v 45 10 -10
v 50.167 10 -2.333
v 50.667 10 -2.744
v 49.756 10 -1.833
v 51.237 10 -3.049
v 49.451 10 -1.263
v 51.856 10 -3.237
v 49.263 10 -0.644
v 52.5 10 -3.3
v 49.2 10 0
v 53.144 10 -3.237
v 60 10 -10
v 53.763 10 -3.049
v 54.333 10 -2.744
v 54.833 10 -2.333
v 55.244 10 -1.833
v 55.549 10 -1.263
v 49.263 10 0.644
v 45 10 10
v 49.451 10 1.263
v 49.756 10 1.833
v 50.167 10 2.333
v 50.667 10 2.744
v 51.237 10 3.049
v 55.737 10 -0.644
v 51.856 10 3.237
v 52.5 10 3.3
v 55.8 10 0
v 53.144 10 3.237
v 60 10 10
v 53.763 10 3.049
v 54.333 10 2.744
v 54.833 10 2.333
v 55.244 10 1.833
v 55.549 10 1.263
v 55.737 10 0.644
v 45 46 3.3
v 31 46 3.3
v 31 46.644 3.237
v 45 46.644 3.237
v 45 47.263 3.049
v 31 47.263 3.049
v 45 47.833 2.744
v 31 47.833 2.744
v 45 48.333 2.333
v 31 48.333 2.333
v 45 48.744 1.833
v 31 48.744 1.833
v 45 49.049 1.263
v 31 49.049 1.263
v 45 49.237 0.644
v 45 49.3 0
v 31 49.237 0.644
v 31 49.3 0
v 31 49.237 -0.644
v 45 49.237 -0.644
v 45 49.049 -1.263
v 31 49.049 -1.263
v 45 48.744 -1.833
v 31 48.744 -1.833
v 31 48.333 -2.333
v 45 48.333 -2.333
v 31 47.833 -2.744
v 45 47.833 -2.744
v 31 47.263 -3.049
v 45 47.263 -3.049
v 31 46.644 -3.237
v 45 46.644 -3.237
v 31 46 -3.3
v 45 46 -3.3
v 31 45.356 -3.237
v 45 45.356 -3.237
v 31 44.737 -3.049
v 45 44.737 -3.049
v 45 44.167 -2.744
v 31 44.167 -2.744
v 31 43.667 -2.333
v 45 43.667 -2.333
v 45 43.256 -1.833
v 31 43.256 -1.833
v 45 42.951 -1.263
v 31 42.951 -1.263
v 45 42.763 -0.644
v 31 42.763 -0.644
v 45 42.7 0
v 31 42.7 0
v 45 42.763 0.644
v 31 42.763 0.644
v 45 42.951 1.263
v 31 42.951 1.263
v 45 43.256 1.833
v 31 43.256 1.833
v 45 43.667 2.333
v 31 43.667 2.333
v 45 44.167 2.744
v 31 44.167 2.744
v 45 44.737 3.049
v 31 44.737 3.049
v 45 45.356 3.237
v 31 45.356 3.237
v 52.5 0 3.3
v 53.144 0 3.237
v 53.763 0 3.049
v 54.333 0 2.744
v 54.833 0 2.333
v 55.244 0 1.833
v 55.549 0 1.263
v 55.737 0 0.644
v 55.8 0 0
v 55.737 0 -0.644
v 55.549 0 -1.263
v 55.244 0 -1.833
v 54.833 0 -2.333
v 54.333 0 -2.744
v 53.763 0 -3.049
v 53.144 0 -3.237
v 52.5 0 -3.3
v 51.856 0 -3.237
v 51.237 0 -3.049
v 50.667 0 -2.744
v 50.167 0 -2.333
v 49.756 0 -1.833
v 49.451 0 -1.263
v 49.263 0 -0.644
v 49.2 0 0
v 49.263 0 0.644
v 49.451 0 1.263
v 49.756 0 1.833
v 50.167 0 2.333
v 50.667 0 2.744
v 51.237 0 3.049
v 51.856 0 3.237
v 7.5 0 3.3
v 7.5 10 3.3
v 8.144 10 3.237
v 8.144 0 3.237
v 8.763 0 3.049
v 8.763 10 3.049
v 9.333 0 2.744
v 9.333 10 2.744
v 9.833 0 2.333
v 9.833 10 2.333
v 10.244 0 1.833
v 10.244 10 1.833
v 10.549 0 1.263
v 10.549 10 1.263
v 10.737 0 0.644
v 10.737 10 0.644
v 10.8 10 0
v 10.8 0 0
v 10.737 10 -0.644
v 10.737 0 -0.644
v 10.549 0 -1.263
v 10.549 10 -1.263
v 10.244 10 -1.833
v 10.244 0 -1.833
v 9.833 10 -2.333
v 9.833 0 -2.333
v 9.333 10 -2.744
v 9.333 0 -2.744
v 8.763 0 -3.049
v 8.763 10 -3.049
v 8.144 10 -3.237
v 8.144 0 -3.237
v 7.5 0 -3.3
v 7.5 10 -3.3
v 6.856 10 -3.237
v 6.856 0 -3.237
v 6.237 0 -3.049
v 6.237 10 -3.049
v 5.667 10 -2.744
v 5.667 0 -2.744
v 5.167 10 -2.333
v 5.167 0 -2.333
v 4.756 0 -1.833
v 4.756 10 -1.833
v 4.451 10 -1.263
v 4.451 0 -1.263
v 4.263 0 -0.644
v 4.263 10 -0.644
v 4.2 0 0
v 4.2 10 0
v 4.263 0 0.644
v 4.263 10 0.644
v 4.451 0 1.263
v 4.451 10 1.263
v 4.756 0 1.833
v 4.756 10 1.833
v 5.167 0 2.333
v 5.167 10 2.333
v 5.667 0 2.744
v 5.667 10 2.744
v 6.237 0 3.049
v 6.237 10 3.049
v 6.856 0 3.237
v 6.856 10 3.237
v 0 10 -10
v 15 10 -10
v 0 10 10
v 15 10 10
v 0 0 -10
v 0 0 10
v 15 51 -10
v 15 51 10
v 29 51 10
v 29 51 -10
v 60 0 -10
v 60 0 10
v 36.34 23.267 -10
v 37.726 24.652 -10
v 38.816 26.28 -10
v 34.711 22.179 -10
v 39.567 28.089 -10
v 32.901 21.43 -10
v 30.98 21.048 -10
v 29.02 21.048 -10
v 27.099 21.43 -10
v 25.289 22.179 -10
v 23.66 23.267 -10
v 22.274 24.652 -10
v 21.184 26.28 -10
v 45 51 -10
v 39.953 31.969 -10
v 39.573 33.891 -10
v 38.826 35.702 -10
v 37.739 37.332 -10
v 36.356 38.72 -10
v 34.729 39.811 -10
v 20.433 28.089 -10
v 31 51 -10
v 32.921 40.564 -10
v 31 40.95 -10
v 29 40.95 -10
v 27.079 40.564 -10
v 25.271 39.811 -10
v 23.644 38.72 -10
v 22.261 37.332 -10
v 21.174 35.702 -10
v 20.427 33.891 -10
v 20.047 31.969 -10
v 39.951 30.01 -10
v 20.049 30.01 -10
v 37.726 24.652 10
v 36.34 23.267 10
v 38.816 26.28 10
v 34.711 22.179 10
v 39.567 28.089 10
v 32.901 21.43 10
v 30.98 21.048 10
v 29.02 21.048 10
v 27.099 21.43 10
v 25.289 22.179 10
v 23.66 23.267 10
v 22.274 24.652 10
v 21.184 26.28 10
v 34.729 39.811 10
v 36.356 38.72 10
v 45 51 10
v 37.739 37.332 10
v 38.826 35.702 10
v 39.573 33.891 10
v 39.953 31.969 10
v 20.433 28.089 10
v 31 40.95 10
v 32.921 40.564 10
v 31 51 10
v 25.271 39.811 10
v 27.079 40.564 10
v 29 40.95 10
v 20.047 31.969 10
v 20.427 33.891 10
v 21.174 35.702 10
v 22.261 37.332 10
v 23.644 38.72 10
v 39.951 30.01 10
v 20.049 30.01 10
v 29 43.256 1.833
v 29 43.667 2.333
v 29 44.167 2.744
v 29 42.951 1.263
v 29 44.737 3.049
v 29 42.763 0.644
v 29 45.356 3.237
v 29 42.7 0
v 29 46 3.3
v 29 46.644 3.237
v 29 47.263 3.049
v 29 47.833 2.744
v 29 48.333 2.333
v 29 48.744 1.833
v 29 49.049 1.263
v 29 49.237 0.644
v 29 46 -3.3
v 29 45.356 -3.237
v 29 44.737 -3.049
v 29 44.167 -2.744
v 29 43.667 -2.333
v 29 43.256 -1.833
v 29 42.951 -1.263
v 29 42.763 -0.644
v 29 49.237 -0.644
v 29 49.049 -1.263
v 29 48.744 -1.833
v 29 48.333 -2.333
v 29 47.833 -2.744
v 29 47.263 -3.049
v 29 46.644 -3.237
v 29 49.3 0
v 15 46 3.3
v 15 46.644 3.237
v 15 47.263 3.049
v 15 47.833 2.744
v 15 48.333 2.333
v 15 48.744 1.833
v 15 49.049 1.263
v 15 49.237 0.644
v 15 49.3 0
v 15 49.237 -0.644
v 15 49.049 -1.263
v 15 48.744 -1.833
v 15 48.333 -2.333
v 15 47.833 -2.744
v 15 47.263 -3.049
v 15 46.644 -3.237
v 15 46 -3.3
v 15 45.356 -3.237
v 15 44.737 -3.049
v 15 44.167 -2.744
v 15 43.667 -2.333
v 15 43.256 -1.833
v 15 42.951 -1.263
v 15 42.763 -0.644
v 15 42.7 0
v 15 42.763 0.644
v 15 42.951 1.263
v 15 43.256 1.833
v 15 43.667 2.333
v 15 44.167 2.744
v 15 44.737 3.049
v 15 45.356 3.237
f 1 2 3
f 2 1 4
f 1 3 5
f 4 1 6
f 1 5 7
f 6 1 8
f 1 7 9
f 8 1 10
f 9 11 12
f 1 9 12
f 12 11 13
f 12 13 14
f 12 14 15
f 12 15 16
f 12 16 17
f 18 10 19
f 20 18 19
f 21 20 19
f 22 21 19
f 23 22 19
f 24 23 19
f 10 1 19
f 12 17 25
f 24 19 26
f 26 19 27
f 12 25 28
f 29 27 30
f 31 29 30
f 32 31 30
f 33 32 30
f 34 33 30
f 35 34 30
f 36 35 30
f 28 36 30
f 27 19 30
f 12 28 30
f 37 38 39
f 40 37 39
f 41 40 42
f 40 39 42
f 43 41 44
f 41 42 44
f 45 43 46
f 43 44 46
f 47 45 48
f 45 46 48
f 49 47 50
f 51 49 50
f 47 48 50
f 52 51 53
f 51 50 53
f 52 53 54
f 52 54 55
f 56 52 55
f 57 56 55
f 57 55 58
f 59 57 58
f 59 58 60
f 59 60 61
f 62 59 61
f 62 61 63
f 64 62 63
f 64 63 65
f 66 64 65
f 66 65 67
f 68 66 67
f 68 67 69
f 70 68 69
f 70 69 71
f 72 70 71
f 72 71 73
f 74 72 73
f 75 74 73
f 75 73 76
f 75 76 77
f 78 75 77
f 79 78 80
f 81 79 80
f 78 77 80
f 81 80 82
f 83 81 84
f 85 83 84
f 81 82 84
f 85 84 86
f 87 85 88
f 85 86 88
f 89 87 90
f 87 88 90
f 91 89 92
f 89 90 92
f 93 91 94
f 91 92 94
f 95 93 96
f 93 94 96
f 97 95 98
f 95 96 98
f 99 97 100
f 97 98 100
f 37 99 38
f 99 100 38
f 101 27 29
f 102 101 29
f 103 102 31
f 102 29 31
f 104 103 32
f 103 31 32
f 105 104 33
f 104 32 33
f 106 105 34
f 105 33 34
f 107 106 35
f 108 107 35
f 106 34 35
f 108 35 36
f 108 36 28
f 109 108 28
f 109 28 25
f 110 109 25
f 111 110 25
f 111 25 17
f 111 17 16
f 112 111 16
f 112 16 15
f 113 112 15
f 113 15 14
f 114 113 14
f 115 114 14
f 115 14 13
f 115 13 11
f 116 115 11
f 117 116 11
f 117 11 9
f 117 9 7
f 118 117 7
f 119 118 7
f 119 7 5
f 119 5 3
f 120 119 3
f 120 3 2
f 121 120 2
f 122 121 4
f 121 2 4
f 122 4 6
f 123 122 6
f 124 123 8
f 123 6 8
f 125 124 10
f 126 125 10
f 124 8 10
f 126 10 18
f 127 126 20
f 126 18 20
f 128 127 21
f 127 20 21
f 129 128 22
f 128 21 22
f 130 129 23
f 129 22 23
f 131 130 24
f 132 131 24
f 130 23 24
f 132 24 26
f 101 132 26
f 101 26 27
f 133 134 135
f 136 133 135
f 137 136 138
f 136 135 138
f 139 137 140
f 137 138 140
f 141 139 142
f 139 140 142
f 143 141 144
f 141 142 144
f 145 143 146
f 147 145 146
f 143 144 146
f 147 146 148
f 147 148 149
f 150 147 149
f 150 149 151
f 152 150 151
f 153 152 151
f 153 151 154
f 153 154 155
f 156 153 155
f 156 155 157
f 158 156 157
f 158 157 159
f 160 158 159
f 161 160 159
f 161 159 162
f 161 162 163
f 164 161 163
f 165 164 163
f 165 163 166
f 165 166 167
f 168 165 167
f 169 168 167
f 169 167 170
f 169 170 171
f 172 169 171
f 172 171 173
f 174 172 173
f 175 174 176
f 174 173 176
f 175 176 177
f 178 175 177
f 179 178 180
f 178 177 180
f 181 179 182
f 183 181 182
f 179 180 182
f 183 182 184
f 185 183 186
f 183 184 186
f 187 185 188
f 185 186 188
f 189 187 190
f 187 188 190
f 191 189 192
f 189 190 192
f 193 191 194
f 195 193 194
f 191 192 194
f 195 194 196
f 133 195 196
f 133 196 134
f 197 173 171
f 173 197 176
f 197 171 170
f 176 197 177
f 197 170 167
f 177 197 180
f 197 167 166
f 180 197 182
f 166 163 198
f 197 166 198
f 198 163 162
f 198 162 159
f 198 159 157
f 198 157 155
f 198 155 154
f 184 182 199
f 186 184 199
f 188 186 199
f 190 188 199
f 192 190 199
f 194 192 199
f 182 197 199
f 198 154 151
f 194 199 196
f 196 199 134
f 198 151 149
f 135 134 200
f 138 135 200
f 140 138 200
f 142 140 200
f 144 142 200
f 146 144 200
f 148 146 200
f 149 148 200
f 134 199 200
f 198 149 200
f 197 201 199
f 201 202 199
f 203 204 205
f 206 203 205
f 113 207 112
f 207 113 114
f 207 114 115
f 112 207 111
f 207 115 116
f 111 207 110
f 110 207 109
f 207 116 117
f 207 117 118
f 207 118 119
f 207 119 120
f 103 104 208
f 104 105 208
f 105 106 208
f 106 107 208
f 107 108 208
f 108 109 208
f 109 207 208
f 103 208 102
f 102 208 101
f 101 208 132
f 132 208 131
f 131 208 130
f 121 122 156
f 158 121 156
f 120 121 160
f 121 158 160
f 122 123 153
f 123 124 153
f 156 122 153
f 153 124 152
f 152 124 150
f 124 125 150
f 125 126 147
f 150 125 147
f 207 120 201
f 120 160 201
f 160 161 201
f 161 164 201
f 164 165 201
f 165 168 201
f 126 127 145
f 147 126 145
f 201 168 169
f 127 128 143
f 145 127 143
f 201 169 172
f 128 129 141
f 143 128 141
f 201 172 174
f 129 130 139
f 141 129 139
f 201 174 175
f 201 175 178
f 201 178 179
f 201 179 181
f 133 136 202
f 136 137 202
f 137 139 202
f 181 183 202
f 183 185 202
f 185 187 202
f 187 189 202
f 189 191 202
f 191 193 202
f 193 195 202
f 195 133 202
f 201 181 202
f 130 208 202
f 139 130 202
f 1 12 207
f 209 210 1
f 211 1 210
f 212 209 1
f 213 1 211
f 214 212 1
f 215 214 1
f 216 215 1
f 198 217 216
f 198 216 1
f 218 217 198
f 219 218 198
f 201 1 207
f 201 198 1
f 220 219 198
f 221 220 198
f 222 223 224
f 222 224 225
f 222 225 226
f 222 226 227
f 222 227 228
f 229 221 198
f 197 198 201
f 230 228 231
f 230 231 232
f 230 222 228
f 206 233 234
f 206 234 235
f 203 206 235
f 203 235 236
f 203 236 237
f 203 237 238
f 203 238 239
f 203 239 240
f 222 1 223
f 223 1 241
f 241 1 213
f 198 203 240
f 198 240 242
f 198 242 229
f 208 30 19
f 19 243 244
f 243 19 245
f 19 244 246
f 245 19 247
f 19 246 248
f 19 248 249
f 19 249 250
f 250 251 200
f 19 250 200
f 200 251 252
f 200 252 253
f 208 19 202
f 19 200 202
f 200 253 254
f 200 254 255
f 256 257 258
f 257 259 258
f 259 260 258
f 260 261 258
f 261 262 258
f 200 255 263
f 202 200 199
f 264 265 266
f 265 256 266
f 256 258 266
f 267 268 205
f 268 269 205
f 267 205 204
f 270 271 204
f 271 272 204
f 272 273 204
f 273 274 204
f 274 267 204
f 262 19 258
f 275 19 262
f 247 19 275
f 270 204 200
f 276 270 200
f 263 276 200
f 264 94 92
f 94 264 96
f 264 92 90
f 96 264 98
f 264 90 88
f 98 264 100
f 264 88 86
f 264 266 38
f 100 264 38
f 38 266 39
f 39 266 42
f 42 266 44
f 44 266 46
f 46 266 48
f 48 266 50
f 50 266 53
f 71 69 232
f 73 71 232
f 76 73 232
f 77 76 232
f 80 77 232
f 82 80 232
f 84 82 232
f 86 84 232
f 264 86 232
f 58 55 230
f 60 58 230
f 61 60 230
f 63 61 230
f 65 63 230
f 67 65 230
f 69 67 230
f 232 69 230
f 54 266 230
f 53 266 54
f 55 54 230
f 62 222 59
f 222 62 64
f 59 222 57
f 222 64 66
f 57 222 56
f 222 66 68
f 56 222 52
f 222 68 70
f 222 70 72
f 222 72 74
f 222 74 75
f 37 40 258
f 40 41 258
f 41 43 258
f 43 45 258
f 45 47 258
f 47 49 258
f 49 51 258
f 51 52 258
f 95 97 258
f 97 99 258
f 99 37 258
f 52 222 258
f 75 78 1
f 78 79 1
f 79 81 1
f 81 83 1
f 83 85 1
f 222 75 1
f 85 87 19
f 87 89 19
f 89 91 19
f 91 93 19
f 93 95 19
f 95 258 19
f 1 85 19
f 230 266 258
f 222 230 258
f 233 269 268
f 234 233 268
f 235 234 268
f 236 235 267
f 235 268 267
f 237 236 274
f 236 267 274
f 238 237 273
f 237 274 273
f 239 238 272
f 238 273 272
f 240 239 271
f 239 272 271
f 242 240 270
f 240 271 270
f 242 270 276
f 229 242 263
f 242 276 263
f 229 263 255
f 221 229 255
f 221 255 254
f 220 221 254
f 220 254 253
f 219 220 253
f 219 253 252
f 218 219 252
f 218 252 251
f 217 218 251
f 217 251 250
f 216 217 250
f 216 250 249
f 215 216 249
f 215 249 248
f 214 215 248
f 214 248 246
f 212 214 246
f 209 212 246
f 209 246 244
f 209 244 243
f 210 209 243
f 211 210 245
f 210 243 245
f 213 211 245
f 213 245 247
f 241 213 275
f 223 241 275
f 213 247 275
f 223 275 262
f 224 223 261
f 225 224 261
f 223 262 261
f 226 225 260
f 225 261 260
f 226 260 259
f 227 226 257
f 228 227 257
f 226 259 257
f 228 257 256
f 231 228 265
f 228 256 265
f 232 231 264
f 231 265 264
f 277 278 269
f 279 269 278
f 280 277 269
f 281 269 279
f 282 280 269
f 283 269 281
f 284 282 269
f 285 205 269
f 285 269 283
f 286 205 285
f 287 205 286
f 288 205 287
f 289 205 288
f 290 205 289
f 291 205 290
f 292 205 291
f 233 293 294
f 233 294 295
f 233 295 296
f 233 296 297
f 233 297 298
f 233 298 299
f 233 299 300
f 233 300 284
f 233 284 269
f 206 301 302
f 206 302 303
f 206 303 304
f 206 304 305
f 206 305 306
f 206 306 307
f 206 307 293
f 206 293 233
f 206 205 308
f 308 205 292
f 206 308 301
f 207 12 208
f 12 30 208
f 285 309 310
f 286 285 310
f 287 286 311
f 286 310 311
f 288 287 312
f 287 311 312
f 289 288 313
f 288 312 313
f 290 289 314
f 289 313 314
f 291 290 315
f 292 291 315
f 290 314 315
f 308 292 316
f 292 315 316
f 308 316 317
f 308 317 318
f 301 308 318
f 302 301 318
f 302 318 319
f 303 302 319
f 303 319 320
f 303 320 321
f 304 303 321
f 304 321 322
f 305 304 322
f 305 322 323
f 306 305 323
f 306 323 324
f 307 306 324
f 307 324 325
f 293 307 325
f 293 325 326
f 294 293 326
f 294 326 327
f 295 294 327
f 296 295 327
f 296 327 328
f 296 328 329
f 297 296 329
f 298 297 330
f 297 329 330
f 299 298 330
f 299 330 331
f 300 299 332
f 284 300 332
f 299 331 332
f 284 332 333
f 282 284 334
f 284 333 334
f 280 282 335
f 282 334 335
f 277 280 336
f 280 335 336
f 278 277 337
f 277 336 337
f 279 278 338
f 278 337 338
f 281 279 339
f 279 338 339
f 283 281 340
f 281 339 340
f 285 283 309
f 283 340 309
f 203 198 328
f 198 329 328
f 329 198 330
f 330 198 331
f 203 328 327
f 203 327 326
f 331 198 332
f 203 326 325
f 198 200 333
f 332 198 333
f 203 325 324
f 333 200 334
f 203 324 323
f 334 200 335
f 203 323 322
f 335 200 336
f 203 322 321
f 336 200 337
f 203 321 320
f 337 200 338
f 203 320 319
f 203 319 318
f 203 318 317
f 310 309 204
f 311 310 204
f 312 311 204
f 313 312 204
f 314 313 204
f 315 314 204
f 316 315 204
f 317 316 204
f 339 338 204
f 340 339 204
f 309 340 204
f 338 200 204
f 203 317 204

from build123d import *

# Parameters (mm, degrees)
BOSS_EXTRUDE1_DEPTH = 10
SKETCH3_R           = 10
CUT_EXTRUDE1_DEPTH  = 26
SKETCH9_R           = 3.3
CUT_EXTRUDE2_DEPTH  = 26
SKETCH10_R          = 3.3
CUT_EXTRUDE3_DEPTH  = 26
SKETCH12_R          = 3.3
CUT_EXTRUDE5_DEPTH  = 46
SKETCH15_W          = 2
SKETCH15_H          = 20
CUT_EXTRUDE7_DEPTH  = 15


with BuildPart() as part:
    # Sketch2 → Boss-Extrude1 (new, symmetric)
    with BuildSketch(Plane.XY):
        Polygon((45, 10), (60, 10), (60, 0), (0, 0), (0, 10), (15, 10), (15, 51), (45, 51), align=None)
    extrude(amount=BOSS_EXTRUDE1_DEPTH, both=True)

    # Sketch3 → Cut-Extrude1 (cut)
    with BuildSketch(Plane.XY.offset(10)):
        with Locations((30, 31)):
            Circle(SKETCH3_R)
    extrude(amount=-CUT_EXTRUDE1_DEPTH, mode=Mode.SUBTRACT)

    # Sketch9 → Cut-Extrude2 (cut)
    with BuildSketch(Plane(origin=(0, 10, 0), x_dir=(1, 0, 0), z_dir=(0, 1, 0))):
        with Locations(Location((7.5, 0, 0), (0, 0, 270))):
            Circle(SKETCH9_R)
    extrude(amount=-CUT_EXTRUDE2_DEPTH, mode=Mode.SUBTRACT)

    # Sketch10 → Cut-Extrude3 (cut)
    with BuildSketch(Plane(origin=(0, 10, 0), x_dir=(1, 0, 0), z_dir=(0, 1, 0))):
        with Locations(Location((52.5, 0, 0), (0, 0, 270))):
            Circle(SKETCH10_R)
    extrude(amount=-CUT_EXTRUDE3_DEPTH, mode=Mode.SUBTRACT)

    # Sketch12 → Cut-Extrude5 (cut)
    with BuildSketch(Plane.ZY.offset(-15)):
        with Locations((0, 46)):
            Circle(SKETCH12_R)
    extrude(amount=-CUT_EXTRUDE5_DEPTH, mode=Mode.SUBTRACT)

    # Sketch15 → Cut-Extrude7 (cut)
    with BuildSketch(Plane(origin=(0, 51, 0), x_dir=(1, 0, 0), z_dir=(0, 1, 0))):
        with Locations((30, 0)):
            Rectangle(SKETCH15_W, SKETCH15_H)
    extrude(amount=-CUT_EXTRUDE7_DEPTH, mode=Mode.SUBTRACT)


solid = part.part
